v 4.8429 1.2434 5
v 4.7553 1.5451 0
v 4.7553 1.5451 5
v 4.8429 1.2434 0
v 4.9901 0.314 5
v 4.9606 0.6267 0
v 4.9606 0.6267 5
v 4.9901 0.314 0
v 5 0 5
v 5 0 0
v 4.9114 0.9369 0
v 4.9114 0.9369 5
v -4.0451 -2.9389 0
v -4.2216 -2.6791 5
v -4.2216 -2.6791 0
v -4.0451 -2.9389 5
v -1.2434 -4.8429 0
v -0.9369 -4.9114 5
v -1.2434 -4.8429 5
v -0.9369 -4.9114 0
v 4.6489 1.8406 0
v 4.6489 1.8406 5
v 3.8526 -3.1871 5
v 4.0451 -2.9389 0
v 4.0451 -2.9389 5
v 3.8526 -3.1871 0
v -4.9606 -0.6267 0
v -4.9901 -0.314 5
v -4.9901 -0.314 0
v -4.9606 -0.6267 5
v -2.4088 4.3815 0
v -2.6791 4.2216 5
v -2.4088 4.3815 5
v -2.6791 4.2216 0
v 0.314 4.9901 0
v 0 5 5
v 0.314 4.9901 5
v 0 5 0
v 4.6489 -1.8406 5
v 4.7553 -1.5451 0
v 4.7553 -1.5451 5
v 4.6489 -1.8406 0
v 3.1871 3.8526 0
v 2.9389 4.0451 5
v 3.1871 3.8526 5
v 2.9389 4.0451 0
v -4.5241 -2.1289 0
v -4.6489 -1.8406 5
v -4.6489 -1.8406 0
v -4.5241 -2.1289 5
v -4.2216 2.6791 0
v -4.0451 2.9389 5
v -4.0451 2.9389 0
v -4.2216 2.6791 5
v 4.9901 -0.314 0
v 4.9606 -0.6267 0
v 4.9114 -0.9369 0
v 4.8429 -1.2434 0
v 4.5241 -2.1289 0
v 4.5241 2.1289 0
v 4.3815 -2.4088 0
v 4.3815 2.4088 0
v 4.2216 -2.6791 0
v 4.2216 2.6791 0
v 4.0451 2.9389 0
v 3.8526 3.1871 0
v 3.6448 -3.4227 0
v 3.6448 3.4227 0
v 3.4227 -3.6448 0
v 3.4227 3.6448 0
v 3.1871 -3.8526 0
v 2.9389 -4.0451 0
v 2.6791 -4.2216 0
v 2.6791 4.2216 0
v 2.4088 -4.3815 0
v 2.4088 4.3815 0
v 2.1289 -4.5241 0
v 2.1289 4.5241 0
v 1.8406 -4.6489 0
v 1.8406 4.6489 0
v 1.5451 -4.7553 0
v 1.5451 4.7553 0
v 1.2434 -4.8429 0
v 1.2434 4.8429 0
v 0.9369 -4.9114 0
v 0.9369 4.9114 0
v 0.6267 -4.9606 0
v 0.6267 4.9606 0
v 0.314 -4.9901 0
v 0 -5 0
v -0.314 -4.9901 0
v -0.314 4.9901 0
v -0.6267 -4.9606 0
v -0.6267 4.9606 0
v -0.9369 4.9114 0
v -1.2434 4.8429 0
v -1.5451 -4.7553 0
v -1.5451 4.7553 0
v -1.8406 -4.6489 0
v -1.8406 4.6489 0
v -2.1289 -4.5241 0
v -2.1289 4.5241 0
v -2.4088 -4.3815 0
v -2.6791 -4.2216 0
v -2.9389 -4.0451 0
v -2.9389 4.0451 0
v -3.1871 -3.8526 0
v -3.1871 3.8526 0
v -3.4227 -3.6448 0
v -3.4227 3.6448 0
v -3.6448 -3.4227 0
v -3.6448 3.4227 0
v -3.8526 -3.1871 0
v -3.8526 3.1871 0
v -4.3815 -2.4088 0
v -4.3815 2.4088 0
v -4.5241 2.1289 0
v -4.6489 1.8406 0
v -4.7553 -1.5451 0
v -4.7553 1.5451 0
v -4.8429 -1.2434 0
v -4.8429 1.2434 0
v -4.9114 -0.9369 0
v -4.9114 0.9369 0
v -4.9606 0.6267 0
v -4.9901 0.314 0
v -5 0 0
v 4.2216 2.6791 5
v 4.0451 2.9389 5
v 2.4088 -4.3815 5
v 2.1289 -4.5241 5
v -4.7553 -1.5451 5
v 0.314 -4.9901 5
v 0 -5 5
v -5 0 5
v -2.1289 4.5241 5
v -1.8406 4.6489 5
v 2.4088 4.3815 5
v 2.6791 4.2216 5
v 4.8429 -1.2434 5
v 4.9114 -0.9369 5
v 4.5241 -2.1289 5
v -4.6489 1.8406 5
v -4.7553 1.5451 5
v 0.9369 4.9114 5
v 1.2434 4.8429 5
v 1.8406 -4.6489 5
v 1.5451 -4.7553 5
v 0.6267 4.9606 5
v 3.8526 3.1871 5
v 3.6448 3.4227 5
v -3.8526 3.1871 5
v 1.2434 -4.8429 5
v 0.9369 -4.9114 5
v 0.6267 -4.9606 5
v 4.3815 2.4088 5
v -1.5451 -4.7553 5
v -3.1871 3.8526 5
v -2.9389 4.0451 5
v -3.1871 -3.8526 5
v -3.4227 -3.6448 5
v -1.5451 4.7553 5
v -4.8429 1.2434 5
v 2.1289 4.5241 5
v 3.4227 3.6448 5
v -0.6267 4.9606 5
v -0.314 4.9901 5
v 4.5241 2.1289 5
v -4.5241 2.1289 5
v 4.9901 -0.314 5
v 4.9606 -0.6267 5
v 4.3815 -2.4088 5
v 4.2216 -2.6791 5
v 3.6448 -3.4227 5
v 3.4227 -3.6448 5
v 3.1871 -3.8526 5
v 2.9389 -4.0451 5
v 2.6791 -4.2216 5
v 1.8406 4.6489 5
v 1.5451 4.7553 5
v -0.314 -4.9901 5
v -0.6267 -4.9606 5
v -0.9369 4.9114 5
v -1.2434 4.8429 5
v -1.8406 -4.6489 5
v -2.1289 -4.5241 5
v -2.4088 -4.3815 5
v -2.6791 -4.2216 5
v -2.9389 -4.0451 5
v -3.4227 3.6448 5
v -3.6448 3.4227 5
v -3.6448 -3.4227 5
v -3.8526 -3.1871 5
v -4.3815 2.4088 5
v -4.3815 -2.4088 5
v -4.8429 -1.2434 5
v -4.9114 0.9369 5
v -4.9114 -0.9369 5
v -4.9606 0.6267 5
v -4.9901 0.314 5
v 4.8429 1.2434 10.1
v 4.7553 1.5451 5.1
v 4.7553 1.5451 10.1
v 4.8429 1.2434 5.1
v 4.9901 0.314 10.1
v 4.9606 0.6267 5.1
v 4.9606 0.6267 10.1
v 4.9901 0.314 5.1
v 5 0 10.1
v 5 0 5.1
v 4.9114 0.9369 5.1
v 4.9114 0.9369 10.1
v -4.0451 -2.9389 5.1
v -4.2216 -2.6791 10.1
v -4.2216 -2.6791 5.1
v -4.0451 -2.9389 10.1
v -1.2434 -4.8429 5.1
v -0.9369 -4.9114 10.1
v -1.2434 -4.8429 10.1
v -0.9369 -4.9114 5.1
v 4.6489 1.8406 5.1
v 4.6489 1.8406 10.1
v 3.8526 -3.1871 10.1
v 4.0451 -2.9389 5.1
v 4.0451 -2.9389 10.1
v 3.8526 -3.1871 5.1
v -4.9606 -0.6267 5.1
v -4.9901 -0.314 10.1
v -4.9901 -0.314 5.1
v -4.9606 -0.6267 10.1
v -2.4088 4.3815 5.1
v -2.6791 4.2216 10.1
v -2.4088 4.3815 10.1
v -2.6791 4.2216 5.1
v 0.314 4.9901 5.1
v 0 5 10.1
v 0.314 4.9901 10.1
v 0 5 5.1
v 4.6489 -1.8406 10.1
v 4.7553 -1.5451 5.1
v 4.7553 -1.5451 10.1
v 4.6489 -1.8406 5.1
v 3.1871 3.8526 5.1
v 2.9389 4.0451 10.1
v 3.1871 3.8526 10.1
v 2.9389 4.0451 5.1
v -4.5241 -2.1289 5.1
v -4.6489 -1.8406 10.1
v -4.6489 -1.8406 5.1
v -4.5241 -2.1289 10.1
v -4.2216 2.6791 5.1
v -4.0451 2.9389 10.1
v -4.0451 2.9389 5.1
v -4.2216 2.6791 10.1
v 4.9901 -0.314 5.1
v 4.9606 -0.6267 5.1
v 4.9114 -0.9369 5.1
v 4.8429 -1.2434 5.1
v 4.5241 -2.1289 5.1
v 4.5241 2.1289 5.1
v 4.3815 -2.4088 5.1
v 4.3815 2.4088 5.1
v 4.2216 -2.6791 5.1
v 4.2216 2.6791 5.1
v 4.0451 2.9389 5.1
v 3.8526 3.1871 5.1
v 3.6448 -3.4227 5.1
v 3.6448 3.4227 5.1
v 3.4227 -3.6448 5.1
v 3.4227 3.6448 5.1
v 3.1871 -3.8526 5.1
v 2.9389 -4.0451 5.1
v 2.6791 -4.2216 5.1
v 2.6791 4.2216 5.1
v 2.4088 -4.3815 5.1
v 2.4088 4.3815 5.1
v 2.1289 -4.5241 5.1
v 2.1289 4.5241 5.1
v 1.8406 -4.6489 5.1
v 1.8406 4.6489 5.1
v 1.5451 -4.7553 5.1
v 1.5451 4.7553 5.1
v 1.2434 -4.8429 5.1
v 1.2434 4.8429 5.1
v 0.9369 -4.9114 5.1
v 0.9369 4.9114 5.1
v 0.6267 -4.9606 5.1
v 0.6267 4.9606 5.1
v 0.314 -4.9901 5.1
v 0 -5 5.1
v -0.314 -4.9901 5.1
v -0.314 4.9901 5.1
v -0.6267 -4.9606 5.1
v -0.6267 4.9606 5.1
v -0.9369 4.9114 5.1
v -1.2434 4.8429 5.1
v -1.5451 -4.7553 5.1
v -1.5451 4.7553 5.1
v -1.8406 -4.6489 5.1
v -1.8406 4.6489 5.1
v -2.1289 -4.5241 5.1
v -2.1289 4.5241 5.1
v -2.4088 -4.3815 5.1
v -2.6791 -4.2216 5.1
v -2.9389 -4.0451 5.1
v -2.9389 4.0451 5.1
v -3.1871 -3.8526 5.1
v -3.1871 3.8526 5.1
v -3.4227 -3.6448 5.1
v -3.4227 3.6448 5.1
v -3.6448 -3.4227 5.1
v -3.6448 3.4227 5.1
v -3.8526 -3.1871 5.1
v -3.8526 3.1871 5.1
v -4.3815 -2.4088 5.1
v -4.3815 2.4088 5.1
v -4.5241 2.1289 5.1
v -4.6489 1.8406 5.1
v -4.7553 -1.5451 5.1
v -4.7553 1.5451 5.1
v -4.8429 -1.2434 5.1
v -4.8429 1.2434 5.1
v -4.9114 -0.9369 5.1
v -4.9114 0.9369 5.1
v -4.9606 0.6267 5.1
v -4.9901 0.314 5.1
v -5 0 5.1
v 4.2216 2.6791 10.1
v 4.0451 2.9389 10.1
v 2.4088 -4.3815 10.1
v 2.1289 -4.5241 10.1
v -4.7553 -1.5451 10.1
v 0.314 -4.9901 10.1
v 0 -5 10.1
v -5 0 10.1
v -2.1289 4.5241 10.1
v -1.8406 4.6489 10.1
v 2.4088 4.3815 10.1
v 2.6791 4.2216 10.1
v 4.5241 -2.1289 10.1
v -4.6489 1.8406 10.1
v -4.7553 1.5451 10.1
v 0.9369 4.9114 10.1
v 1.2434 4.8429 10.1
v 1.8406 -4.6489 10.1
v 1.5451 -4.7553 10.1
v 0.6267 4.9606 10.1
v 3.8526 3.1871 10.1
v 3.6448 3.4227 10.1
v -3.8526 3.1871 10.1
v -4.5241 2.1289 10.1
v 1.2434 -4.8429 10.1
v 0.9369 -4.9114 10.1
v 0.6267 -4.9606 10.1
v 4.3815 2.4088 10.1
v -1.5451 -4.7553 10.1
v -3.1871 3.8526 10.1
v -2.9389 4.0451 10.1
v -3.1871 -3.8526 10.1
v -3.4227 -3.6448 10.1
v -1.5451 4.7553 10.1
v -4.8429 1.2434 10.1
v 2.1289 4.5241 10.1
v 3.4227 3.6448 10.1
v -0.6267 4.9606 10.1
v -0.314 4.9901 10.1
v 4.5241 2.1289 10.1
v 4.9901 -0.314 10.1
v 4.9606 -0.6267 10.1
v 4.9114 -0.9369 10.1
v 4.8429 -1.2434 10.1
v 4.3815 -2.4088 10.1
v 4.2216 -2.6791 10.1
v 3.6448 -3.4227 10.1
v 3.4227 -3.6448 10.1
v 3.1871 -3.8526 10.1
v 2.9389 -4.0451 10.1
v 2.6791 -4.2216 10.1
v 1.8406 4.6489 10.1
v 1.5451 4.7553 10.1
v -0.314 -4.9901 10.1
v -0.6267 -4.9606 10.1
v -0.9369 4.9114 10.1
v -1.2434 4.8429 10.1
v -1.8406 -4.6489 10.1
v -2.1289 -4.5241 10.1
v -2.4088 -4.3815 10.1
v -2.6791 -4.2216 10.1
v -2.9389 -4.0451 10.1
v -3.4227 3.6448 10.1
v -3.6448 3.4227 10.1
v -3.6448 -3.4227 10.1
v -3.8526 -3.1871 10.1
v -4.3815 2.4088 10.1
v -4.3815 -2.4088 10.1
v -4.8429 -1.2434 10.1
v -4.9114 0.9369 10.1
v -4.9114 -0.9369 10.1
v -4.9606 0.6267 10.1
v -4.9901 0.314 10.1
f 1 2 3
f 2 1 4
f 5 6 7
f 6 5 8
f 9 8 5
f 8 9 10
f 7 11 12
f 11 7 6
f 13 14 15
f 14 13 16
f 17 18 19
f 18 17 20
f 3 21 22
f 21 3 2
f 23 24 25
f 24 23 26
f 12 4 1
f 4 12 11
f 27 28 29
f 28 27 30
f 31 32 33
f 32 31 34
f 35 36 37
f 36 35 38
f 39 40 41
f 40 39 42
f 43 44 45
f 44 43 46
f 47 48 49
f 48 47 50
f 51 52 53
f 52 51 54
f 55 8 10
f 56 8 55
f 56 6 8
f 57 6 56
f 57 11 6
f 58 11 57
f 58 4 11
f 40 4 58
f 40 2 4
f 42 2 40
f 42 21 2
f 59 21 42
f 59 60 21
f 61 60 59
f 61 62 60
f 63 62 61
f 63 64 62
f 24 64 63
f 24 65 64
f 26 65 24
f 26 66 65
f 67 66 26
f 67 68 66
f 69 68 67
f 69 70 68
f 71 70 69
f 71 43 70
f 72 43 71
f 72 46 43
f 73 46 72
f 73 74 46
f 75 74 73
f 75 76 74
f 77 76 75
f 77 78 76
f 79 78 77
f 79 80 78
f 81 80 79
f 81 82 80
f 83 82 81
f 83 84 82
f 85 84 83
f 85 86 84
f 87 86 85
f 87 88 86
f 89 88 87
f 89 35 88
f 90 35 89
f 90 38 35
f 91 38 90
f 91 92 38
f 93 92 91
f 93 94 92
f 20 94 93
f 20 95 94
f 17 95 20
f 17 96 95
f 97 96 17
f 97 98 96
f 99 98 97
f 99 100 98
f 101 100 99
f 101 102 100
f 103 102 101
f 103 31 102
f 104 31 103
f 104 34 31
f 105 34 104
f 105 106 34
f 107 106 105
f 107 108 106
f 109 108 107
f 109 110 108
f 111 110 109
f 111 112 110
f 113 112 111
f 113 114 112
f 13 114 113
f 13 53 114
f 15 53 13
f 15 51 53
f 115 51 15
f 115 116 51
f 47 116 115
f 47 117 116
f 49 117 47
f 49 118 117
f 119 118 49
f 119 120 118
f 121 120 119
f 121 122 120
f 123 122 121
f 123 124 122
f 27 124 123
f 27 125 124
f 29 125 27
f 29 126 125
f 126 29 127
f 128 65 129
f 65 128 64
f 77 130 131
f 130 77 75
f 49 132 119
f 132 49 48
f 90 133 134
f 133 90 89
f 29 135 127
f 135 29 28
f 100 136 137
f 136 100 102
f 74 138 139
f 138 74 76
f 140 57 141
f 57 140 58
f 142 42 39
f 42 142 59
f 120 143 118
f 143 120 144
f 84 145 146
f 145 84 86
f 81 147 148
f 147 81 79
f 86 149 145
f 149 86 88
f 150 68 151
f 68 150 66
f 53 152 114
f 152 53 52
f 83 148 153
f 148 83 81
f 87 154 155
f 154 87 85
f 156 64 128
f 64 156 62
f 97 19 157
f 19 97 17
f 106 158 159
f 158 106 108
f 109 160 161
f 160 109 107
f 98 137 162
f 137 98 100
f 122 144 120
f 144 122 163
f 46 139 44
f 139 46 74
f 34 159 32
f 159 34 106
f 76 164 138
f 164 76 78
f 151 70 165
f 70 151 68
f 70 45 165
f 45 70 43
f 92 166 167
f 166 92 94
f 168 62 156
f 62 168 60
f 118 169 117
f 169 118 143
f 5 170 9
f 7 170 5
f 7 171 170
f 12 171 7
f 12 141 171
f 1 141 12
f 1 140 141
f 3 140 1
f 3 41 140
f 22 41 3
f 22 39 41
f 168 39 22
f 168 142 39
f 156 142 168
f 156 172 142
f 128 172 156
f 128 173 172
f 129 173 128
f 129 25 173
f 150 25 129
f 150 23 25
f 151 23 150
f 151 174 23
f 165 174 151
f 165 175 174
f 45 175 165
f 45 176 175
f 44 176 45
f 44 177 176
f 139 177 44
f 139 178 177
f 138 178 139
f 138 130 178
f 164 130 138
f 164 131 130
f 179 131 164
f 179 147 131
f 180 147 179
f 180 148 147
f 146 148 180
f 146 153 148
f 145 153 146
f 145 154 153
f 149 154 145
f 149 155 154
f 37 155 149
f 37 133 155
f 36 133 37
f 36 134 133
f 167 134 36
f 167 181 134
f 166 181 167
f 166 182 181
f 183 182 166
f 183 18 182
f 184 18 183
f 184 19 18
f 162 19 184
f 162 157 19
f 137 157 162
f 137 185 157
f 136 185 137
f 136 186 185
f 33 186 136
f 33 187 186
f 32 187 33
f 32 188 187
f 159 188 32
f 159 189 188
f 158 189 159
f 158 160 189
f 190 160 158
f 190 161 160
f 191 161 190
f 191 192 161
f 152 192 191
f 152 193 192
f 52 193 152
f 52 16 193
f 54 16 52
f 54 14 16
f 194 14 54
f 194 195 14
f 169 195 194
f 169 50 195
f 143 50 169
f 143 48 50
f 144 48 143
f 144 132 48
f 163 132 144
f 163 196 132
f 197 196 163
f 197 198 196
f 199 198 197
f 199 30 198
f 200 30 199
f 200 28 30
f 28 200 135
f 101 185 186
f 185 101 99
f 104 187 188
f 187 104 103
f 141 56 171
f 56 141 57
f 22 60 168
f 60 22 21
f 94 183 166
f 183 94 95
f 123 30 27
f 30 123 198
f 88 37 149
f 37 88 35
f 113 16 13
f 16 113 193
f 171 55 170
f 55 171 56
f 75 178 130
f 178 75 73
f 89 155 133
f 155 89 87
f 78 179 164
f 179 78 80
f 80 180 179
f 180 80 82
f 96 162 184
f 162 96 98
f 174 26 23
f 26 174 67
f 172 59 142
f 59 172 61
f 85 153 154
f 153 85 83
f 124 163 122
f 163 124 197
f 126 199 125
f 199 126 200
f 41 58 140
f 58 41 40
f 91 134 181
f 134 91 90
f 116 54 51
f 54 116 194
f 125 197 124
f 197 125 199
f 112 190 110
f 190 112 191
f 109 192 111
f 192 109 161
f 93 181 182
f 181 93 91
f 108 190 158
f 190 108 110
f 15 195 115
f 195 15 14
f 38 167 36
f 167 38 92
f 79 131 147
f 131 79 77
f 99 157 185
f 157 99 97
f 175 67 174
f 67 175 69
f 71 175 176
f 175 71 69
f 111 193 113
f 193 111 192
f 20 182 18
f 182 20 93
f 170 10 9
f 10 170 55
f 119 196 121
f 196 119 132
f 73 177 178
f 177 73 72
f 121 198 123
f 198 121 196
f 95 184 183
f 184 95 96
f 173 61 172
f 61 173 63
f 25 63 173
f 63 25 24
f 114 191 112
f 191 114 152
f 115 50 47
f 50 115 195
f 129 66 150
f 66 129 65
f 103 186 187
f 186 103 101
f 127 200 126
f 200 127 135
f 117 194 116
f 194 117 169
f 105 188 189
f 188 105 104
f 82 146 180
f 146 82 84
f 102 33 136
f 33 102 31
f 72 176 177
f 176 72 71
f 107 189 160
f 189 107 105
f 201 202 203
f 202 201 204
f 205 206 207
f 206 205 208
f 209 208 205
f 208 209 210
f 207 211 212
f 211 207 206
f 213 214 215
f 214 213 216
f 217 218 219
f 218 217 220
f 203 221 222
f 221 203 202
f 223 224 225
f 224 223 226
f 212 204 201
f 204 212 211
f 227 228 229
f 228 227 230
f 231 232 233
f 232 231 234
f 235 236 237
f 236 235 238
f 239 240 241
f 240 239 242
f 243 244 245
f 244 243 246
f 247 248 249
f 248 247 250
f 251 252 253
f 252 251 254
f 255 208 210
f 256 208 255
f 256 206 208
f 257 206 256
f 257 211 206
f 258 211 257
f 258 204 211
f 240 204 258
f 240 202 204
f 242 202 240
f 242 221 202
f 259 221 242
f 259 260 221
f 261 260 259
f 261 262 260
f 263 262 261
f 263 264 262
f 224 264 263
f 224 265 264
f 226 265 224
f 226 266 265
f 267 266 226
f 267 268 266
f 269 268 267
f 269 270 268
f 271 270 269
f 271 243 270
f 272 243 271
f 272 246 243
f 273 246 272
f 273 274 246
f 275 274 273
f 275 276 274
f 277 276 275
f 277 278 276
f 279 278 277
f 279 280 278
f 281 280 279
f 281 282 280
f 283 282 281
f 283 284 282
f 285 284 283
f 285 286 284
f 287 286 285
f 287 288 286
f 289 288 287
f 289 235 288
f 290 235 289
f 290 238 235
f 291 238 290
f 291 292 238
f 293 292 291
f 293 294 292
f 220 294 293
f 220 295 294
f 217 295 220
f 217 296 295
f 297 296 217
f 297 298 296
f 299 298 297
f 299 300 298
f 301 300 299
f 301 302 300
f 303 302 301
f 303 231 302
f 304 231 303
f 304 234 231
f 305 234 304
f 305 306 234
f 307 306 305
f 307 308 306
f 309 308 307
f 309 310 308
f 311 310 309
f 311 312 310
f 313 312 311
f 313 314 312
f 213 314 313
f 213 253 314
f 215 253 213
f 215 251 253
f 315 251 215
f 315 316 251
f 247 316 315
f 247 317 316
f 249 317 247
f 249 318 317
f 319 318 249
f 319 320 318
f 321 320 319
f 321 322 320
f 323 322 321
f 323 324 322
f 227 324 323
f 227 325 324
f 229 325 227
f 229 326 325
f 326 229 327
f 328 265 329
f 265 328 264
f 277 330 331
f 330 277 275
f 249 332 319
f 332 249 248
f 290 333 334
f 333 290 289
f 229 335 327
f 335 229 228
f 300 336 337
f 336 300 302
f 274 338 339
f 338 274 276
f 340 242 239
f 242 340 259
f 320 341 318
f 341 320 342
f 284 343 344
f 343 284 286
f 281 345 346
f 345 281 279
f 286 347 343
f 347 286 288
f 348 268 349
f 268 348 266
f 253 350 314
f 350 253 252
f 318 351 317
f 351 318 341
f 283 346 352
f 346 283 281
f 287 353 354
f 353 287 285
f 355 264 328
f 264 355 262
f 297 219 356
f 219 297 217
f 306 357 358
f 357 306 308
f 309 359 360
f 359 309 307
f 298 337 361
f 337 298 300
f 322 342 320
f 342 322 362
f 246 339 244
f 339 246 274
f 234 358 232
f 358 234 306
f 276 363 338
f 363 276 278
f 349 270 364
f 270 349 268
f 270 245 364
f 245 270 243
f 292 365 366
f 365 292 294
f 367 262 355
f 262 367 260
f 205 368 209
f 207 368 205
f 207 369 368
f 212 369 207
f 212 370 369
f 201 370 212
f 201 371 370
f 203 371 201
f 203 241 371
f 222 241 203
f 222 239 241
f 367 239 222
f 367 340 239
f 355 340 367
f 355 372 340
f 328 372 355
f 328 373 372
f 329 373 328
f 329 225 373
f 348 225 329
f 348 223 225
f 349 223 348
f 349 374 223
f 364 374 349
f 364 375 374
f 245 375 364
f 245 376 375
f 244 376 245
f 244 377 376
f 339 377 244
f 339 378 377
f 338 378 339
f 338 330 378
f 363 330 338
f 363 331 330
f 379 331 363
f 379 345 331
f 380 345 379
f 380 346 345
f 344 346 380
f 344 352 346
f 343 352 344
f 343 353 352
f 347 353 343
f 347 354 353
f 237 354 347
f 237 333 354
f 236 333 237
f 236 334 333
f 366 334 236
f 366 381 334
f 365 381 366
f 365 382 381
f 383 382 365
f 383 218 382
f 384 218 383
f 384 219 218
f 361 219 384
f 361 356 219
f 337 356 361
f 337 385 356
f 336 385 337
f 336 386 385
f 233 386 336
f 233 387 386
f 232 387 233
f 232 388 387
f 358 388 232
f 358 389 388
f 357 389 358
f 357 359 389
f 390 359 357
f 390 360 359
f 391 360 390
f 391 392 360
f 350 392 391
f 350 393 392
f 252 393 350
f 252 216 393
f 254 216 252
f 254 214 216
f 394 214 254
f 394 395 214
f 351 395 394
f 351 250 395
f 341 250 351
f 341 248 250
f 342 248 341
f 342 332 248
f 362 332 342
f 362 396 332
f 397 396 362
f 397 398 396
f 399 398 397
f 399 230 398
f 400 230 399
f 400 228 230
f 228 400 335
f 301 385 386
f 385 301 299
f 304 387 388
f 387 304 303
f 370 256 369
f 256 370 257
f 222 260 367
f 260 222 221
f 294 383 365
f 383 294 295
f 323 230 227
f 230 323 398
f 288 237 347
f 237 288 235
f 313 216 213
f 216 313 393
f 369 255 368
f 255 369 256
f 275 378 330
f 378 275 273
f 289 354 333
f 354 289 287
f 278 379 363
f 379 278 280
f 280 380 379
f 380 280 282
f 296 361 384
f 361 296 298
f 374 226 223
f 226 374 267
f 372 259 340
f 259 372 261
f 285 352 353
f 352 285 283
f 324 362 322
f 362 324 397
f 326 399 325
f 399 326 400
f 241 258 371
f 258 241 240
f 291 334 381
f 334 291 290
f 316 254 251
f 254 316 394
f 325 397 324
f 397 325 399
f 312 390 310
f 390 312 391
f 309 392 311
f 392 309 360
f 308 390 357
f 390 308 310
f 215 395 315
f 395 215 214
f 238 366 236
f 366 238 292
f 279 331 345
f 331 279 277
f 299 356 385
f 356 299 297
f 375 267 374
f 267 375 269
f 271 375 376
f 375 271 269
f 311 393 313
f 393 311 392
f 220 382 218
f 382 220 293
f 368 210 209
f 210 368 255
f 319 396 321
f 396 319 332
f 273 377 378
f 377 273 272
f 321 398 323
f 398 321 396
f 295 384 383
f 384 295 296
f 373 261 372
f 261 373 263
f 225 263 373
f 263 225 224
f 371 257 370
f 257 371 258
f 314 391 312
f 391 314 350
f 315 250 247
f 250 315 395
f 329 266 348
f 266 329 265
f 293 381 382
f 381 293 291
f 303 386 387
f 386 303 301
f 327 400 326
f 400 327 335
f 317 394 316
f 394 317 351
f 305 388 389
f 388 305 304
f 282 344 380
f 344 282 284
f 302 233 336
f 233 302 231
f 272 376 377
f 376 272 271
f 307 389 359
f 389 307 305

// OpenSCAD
/* 
	Supplemental Valve 2

*/

$fn = 100; // increase the smoothness of the cylinders

// Define the dimensions
chamber_diameter = 10; // Diameter of both chambers
membrane_thickness = 0.1; // 100 microns
chamber_height = 5; // Height of each chamber
port_diameter = 2; // Diameter of the ports
port_offset = chamber_diameter / 4; // Offset of the ports

// Draw the fluid chamber
cylinder(h=chamber_height, d=chamber_diameter);

// Draw the pneumatic chamber with membrane
translate([0, 0, chamber_height + membrane_thickness])
    cylinder(h=chamber_height, d=chamber_diameter);

// Draw the two offset ports
translate([port_offset, 0, 0])
    cylinder(h=chamber_height / 2, d=port_diameter);

translate([-port_offset, 0, 0])
    cylinder(h=chamber_height / 2, d=port_diameter);
